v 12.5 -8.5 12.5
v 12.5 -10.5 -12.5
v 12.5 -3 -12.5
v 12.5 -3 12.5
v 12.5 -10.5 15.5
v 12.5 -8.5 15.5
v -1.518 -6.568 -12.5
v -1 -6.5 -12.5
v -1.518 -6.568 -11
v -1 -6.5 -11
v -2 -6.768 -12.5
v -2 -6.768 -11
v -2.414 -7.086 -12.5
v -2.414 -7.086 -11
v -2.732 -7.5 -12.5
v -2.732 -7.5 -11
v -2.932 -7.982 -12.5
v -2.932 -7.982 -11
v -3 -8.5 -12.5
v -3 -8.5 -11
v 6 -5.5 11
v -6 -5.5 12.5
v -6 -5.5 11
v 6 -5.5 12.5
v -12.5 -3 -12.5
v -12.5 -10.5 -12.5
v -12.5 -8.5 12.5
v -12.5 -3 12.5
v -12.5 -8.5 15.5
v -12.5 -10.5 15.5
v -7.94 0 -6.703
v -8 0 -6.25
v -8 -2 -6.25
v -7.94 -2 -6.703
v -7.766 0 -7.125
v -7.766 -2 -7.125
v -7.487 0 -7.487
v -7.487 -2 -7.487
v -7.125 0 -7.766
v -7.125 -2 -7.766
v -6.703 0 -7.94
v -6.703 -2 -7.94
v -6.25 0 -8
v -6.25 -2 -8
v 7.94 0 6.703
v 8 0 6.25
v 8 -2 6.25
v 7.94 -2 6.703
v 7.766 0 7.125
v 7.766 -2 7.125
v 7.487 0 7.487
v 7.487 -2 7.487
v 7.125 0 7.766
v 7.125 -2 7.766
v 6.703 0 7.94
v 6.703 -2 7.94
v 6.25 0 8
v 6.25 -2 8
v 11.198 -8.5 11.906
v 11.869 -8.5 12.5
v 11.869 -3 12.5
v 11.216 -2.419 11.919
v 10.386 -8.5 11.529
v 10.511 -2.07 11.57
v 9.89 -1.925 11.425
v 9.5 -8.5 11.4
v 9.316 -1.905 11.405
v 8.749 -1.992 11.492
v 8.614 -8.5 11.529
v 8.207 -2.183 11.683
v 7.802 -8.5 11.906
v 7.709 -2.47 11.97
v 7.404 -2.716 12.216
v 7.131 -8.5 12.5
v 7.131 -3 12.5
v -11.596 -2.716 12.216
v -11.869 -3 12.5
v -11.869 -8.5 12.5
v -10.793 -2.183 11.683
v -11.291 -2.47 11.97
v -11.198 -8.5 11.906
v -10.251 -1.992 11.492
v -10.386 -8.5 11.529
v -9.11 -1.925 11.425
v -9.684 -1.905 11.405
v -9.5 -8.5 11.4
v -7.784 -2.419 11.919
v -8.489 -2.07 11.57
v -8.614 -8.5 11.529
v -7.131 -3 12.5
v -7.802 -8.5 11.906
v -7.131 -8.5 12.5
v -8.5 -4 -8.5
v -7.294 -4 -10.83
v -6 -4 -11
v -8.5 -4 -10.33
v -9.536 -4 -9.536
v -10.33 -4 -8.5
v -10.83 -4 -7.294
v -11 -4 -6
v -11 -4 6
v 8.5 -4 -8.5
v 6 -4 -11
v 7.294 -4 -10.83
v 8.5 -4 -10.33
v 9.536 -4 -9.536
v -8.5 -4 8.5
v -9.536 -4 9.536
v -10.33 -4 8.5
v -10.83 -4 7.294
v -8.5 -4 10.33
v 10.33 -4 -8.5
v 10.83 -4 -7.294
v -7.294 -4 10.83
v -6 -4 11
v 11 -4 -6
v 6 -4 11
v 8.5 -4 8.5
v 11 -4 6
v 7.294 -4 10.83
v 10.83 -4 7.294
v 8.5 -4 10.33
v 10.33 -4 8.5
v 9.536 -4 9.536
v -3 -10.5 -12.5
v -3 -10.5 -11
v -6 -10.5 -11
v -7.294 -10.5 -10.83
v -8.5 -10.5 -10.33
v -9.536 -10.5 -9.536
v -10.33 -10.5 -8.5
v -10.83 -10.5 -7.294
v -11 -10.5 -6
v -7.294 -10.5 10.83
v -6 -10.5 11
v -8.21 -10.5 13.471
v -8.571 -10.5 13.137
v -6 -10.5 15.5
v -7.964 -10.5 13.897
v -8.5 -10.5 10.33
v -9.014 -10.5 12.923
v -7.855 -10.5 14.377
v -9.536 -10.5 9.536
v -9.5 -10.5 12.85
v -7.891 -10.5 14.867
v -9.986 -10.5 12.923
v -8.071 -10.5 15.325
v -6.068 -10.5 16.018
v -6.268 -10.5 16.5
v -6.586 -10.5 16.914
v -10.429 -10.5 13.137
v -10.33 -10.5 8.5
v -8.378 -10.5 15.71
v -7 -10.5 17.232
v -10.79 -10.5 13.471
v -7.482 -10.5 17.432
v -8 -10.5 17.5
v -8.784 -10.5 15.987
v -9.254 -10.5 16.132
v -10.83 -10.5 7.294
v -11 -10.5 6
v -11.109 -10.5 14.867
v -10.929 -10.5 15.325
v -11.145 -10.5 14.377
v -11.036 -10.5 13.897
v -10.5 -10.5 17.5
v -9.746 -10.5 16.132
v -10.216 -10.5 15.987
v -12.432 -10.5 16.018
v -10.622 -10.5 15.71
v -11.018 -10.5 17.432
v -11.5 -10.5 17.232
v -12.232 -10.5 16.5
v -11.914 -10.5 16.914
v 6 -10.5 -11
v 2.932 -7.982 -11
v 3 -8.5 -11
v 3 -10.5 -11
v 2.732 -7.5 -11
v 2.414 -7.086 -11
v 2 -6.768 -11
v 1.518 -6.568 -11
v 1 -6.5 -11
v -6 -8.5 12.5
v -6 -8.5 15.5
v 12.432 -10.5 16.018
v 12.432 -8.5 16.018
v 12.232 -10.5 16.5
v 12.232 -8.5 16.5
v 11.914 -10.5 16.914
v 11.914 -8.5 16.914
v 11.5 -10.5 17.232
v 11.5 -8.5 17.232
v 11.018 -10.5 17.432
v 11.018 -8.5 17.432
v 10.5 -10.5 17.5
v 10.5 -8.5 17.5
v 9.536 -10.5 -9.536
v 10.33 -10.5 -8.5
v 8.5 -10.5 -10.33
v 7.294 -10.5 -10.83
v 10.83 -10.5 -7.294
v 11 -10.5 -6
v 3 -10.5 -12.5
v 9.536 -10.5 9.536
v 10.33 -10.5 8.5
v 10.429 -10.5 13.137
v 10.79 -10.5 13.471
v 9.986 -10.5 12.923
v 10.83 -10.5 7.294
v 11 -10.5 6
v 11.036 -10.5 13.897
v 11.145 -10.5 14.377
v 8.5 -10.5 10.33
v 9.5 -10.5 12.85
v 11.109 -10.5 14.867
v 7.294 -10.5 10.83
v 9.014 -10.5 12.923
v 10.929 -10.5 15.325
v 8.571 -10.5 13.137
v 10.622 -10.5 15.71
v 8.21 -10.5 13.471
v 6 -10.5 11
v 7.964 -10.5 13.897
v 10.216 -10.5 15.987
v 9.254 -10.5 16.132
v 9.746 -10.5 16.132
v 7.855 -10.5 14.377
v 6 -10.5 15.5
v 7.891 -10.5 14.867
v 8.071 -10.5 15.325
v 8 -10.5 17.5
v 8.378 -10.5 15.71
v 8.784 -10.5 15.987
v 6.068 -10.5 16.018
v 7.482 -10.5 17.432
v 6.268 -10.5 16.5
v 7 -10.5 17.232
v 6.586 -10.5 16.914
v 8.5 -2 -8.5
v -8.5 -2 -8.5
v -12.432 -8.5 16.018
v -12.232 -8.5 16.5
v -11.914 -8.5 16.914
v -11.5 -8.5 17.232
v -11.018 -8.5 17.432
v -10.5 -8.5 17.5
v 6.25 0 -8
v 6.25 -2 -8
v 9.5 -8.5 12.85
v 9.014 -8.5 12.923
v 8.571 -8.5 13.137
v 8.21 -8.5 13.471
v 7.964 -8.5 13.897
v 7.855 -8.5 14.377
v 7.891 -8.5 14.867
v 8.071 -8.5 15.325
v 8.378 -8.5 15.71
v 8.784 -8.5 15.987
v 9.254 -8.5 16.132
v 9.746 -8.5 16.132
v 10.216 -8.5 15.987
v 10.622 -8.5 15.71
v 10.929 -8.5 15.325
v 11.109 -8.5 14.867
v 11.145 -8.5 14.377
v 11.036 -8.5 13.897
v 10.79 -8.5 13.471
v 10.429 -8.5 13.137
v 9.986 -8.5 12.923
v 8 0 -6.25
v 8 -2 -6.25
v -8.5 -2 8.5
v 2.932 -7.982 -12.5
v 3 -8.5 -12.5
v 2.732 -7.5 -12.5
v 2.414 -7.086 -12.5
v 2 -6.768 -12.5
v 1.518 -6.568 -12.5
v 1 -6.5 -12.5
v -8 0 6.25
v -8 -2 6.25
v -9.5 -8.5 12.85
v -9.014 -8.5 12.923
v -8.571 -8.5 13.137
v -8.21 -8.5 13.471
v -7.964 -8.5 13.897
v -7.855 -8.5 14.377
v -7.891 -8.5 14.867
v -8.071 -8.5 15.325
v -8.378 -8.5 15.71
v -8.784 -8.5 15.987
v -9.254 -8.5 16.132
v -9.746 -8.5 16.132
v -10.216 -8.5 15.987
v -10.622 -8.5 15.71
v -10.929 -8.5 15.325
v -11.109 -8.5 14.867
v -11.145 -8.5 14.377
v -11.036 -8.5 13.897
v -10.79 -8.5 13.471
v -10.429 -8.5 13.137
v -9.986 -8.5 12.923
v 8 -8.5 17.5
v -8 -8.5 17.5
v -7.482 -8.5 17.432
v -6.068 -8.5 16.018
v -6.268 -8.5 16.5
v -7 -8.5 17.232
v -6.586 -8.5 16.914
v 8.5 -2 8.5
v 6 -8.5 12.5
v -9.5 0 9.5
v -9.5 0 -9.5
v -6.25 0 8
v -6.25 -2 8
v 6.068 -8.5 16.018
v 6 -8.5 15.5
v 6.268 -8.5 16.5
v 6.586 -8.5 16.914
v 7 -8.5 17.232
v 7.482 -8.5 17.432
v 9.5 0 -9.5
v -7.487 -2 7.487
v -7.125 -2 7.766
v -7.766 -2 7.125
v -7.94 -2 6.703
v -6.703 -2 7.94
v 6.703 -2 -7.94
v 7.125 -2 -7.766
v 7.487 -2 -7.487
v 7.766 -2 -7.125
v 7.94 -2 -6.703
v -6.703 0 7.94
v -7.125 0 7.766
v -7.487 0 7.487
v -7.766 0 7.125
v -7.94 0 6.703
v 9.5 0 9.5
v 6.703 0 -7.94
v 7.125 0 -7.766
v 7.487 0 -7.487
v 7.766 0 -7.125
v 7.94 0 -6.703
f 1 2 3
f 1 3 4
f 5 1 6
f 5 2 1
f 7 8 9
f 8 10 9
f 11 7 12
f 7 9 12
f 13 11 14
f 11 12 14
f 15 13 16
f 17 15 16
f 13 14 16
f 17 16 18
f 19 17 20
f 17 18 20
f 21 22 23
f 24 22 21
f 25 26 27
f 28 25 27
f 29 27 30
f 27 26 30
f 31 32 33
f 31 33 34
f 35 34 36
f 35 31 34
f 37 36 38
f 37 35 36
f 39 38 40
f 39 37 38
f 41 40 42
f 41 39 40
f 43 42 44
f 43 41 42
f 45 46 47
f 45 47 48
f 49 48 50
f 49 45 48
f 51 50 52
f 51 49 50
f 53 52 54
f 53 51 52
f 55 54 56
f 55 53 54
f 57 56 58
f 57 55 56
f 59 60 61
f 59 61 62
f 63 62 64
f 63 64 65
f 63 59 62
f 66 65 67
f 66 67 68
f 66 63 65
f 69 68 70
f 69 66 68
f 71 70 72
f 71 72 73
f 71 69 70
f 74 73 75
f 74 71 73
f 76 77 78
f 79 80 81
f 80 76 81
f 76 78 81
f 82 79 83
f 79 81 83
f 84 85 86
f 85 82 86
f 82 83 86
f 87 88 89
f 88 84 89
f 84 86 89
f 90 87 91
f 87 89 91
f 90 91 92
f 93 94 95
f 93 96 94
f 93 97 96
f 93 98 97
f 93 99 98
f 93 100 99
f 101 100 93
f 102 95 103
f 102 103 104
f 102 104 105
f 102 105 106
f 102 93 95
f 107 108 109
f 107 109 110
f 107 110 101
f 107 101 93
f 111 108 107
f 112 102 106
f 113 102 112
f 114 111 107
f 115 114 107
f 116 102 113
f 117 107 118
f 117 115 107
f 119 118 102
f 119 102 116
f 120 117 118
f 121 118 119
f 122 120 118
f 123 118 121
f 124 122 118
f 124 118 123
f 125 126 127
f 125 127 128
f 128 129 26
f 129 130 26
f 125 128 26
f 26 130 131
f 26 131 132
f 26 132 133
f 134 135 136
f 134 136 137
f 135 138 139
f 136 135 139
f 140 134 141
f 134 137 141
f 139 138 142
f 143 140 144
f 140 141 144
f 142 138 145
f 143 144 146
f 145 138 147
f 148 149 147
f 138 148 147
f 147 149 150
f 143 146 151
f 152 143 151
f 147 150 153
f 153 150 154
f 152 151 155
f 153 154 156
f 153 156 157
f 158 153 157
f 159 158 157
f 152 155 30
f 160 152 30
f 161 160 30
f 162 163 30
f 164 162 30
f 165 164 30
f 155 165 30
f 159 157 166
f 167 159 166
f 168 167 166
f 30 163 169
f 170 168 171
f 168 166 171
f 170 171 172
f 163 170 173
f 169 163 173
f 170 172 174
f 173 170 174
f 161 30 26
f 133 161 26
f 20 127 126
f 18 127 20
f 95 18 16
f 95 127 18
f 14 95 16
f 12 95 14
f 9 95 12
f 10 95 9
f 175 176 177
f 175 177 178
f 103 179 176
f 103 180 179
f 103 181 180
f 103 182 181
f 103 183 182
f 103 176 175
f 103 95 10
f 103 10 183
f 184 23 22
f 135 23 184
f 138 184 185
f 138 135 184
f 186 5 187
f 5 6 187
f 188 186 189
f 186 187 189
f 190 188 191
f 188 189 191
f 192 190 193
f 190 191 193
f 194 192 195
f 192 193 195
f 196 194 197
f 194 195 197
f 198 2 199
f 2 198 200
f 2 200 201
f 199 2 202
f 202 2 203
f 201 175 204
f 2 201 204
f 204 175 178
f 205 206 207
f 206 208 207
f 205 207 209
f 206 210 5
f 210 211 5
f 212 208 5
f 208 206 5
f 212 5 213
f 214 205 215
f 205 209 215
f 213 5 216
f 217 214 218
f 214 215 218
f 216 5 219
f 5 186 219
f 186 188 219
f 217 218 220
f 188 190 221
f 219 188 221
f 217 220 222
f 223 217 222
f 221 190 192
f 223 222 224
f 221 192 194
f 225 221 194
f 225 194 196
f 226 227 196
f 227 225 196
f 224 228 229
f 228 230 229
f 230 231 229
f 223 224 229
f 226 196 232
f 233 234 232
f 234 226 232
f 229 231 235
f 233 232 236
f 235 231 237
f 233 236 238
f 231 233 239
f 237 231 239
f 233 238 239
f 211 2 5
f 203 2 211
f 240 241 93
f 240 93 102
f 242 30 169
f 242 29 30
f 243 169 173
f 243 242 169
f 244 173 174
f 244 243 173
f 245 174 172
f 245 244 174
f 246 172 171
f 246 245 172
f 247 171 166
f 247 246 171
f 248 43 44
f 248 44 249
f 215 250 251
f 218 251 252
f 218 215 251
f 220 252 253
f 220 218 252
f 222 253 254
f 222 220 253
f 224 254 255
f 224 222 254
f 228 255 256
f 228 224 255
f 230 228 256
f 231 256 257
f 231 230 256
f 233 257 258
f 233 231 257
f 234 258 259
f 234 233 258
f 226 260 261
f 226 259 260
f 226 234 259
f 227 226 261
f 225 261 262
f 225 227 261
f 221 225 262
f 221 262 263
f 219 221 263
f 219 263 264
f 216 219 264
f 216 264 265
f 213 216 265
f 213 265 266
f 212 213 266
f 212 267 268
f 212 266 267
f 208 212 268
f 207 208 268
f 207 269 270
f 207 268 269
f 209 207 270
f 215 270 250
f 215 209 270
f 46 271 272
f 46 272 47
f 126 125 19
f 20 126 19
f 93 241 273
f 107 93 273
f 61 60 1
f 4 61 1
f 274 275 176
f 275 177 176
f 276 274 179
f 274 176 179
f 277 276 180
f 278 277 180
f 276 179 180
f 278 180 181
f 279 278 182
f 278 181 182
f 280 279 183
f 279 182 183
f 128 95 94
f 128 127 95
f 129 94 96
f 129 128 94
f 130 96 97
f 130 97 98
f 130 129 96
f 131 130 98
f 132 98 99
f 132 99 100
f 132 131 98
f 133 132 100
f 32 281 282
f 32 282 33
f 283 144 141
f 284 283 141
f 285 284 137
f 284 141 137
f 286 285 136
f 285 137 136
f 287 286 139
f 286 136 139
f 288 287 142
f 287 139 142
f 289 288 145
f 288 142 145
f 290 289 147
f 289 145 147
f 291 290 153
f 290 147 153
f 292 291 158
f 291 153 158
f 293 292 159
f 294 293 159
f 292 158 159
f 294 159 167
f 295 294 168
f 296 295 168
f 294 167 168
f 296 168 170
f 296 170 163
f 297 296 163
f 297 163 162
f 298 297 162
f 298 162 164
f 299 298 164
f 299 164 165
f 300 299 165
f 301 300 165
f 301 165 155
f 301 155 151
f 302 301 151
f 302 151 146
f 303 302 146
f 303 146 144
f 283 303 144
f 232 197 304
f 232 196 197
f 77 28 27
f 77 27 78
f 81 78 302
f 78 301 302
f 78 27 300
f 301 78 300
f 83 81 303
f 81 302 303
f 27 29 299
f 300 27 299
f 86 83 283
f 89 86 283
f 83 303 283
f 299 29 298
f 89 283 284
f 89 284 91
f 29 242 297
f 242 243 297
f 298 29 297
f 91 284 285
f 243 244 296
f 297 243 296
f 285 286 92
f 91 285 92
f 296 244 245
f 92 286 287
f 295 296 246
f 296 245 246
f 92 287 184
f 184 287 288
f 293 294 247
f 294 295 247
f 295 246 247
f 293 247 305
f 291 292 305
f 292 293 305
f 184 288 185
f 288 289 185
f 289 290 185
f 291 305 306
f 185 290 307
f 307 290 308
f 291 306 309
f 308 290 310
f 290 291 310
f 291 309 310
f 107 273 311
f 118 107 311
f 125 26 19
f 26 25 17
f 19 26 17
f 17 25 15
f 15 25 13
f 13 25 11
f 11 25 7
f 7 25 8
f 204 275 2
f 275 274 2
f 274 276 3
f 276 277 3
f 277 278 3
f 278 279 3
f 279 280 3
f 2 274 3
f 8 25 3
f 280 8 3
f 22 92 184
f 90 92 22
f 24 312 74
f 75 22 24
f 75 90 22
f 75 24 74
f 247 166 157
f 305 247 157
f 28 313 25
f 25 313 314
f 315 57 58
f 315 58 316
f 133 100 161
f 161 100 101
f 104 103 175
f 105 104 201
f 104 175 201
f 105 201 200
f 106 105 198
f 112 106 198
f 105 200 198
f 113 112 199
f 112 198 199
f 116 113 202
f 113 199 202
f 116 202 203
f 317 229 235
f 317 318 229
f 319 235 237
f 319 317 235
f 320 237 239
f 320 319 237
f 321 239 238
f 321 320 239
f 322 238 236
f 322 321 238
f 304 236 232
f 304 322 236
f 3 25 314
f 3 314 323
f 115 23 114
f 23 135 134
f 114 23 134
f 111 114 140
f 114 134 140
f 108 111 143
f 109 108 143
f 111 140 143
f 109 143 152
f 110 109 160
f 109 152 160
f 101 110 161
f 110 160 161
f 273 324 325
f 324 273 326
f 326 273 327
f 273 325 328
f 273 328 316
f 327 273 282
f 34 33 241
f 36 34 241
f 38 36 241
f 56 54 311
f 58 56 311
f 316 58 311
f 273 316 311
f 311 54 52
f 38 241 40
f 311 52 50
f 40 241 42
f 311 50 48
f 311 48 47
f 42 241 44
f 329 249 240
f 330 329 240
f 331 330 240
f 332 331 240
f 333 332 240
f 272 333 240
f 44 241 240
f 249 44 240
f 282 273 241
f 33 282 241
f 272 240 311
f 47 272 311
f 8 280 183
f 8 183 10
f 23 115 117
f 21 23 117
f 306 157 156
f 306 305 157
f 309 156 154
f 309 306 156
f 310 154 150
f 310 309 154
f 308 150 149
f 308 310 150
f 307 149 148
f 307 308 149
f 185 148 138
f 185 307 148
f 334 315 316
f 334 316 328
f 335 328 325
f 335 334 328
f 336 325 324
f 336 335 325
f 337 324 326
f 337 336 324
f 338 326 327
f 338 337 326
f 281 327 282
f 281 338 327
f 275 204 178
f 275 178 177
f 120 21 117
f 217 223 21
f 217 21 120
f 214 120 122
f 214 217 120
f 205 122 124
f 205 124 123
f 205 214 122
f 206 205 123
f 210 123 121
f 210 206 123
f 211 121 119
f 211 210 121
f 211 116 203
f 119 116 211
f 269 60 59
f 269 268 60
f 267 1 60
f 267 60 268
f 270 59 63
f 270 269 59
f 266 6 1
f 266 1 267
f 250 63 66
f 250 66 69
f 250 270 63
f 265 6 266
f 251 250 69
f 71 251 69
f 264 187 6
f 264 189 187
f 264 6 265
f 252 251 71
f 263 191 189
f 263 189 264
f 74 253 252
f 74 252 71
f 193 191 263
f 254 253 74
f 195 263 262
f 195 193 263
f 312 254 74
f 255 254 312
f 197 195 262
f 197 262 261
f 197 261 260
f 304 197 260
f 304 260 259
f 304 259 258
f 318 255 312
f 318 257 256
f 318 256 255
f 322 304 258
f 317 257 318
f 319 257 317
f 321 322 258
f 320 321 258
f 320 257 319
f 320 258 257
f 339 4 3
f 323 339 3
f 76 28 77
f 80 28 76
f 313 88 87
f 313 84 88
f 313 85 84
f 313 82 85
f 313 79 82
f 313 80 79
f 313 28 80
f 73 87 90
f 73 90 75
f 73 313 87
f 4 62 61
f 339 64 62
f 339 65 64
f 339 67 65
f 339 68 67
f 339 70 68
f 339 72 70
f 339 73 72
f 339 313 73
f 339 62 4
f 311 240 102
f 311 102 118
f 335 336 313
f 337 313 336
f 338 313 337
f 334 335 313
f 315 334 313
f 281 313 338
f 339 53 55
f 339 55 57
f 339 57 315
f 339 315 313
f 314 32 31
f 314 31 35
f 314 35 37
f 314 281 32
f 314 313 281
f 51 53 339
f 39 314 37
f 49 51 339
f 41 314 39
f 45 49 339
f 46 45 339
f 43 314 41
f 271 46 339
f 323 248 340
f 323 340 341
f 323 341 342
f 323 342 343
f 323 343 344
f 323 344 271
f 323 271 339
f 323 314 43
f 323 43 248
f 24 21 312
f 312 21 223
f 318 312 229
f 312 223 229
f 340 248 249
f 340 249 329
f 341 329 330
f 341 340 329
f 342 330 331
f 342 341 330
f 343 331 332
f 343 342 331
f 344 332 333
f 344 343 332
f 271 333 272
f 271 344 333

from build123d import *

# Parameters (mm, degrees)
SZKIC1_W                    = 25
SZKIC1_H                    = 25
DODANIE_WYCI_GNI_CIE1_DEPTH = 2
SZKIC2_W                    = 25
SZKIC2_H                    = 25
SZKIC2_W_2                  = 17
SZKIC2_H_2                  = 17
DODANIE_WYCI_GNI_CIE2_DEPTH = 2
SZKIC3_W                    = 25
SZKIC3_H                    = 25
SZKIC3_W_2                  = 22
SZKIC3_H_2                  = 22
DODANIE_WYCI_GNI_CIE3_DEPTH = 6.5
SZKIC4_W                    = 12
SZKIC4_H                    = 5
WYTNIJ_WYCI_GNI_CIE1_DEPTH  = 1.5
SFAZOWANIE1_SIZE            = 3
SZKIC5_W                    = 6.5
SZKIC5_H                    = 5
DODANIE_WYCI_GNI_CIE4_DEPTH = 2
SZKIC8_R                    = 1.65
WYTNIJ_WYCI_GNI_CIE3_DEPTH  = 24.932195888
ZAOKR_GLENIE1_R             = 2
WYTNIJ_WYCI_GNI_CIE4_START  = -2
SZKIC9_R                    = 3.1
WYTNIJ_WYCI_GNI_CIE4_DEPTH  = 22.932195888
ZAOKR_GLENIE1_OF_LUSTRO1_R  = 2
SZKIC6_W                    = 6
SZKIC6_H                    = 4
WYTNIJ_WYCI_GNI_CIE2_DEPTH  = 10
ZAOKR_GLENIE4_R             = 2
ZAOKR_GLENIE5_R             = 5


with BuildPart() as part:
    # Szkic1 → Dodanie-wyciągnięcie1 (new body)
    with BuildSketch(Plane(origin=(0, 0, 0), x_dir=(1, 0, 0), z_dir=(0, 1, 0))):
        Rectangle(SZKIC1_W, SZKIC1_H)
        with BuildLine():
            Line((-6.25, 8), (6.25, 8))
            ThreePointArc((6.25, 8), (7.487436867, 7.487436867), (8, 6.25))
            Line((8, 6.25), (8, -6.25))
            ThreePointArc((8, -6.25), (7.487436867, -7.487436867), (6.25, -8))
            Line((6.25, -8), (-6.25, -8))
            ThreePointArc((-6.25, -8), (-7.487436867, -7.487436867), (-8, -6.25))
            Line((-8, -6.25), (-8, 6.25))
            ThreePointArc((-8, 6.25), (-7.487436867, 7.487436867), (-6.25, 8))
        make_face(mode=Mode.SUBTRACT)
    extrude(amount=-DODANIE_WYCI_GNI_CIE1_DEPTH)

    # Szkic2 → Dodanie-wyciągnięcie2 (add)
    with BuildSketch(Plane.XZ.offset(2)):
        Rectangle(SZKIC2_W, SZKIC2_H)
        Rectangle(SZKIC2_W_2, SZKIC2_H_2, mode=Mode.SUBTRACT)
    extrude(amount=DODANIE_WYCI_GNI_CIE2_DEPTH)

    # Szkic3 → Dodanie-wyciągnięcie3 (add)
    with BuildSketch(Plane.XZ.offset(4)):
        Rectangle(SZKIC3_W, SZKIC3_H)
        Rectangle(SZKIC3_W_2, SZKIC3_H_2, mode=Mode.SUBTRACT)
    extrude(amount=DODANIE_WYCI_GNI_CIE3_DEPTH)

    # Szkic4 → Wytnij-wyciągnięcie1 (cut)
    with BuildSketch(Plane.XY.offset(12.5)):
        with Locations((0, -8)):
            Rectangle(SZKIC4_W, SZKIC4_H)
    extrude(amount=-WYTNIJ_WYCI_GNI_CIE1_DEPTH, mode=Mode.SUBTRACT)

    # Sfazowanie1
    sfazowanie1_edges = [part.edges().sort_by_distance(p)[0] for p in [
        (0, 0, 12.5),
        (-12.5, 0, 0),
        (0, 0, -12.5),
        (12.5, 0, 0),
    ]]
    chamfer(sfazowanie1_edges, length=SFAZOWANIE1_SIZE)

    # Szkic5 → Dodanie-wyciągnięcie4 (add)
    with BuildSketch(Plane.XZ.offset(10.5)):
        with Locations((-9.25, 15)):
            Rectangle(SZKIC5_W, SZKIC5_H)
    dodanie_wyci_gni_cie4 = extrude(amount=-DODANIE_WYCI_GNI_CIE4_DEPTH)

    # Szkic8 → Wytnij-wyciągnięcie3 (cut, through all)
    with BuildSketch(Plane.XZ.offset(10.5)):
        with Locations(Location((-9.5, 14.5, 0), (0, 0, 270))):
            Circle(SZKIC8_R)
    wytnij_wyci_gni_cie3 = extrude(amount=-WYTNIJ_WYCI_GNI_CIE3_DEPTH, mode=Mode.SUBTRACT)

    # Zaokrąglenie1
    zaokr_glenie1_edges = [part.edges().sort_by_distance(p)[0] for p in [
        (-12.5, -9.5, 17.5),
        (-6, -9.5, 17.5),
    ]]
    fillet(zaokr_glenie1_edges, radius=ZAOKR_GLENIE1_R)

    # Szkic9 → Wytnij-wyciągnięcie4 (cut, through all)
    with BuildSketch(Plane.XZ.offset(10.5).offset(WYTNIJ_WYCI_GNI_CIE4_START)):
        with Locations((-9.5, 14.5)):
            Circle(SZKIC9_R)
    wytnij_wyci_gni_cie4 = extrude(amount=-WYTNIJ_WYCI_GNI_CIE4_DEPTH, mode=Mode.SUBTRACT)

    # Lustro1: Dodanie-wyciągnięcie4, Wytnij-wyciągnięcie3, Wytnij-wyciągnięcie4 across plane
    add(dodanie_wyci_gni_cie4.mirror(Plane(origin=(0, 0, 0), x_dir=(0, 0, 1), z_dir=(1, 0, 0))))
    add(wytnij_wyci_gni_cie3.mirror(Plane(origin=(0, 0, 0), x_dir=(0, 0, 1), z_dir=(1, 0, 0))), mode=Mode.SUBTRACT)
    add(wytnij_wyci_gni_cie4.mirror(Plane(origin=(0, 0, 0), x_dir=(0, 0, 1), z_dir=(1, 0, 0))), mode=Mode.SUBTRACT)

    # Zaokrąglenie1 of Lustro1
    zaokr_glenie1_of_lustro1_edges = [part.edges().sort_by_distance(p)[0] for p in [
        (12.5, -9.5, 17.5),
        (6, -9.5, 17.5),
    ]]
    fillet(zaokr_glenie1_of_lustro1_edges, radius=ZAOKR_GLENIE1_OF_LUSTRO1_R)

    # Szkic6 → Wytnij-wyciągnięcie2 (cut)
    with BuildSketch(Plane(origin=(0, 0, -12.5), x_dir=(-1, 0, 0), z_dir=(0, 0, -1))):
        with Locations((0, -8.5)):
            Rectangle(SZKIC6_W, SZKIC6_H)
    extrude(amount=-WYTNIJ_WYCI_GNI_CIE2_DEPTH, mode=Mode.SUBTRACT)

    # Zaokrąglenie4
    zaokr_glenie4_edges = [part.edges().sort_by_distance(p)[0] for p in [
        (3, -6.5, -11.75),
        (-3, -6.5, -11.75),
    ]]
    fillet(zaokr_glenie4_edges, radius=ZAOKR_GLENIE4_R)

    # Zaokrąglenie5
    zaokr_glenie5_edges = [part.edges().sort_by_distance(p)[0] for p in [
        (11, -7.25, -11),
        (-11, -7.25, -11),
        (-11, -7.25, 11),
        (11, -7.25, 11),
    ]]
    fillet(zaokr_glenie5_edges, radius=ZAOKR_GLENIE5_R)


solid = part.part
